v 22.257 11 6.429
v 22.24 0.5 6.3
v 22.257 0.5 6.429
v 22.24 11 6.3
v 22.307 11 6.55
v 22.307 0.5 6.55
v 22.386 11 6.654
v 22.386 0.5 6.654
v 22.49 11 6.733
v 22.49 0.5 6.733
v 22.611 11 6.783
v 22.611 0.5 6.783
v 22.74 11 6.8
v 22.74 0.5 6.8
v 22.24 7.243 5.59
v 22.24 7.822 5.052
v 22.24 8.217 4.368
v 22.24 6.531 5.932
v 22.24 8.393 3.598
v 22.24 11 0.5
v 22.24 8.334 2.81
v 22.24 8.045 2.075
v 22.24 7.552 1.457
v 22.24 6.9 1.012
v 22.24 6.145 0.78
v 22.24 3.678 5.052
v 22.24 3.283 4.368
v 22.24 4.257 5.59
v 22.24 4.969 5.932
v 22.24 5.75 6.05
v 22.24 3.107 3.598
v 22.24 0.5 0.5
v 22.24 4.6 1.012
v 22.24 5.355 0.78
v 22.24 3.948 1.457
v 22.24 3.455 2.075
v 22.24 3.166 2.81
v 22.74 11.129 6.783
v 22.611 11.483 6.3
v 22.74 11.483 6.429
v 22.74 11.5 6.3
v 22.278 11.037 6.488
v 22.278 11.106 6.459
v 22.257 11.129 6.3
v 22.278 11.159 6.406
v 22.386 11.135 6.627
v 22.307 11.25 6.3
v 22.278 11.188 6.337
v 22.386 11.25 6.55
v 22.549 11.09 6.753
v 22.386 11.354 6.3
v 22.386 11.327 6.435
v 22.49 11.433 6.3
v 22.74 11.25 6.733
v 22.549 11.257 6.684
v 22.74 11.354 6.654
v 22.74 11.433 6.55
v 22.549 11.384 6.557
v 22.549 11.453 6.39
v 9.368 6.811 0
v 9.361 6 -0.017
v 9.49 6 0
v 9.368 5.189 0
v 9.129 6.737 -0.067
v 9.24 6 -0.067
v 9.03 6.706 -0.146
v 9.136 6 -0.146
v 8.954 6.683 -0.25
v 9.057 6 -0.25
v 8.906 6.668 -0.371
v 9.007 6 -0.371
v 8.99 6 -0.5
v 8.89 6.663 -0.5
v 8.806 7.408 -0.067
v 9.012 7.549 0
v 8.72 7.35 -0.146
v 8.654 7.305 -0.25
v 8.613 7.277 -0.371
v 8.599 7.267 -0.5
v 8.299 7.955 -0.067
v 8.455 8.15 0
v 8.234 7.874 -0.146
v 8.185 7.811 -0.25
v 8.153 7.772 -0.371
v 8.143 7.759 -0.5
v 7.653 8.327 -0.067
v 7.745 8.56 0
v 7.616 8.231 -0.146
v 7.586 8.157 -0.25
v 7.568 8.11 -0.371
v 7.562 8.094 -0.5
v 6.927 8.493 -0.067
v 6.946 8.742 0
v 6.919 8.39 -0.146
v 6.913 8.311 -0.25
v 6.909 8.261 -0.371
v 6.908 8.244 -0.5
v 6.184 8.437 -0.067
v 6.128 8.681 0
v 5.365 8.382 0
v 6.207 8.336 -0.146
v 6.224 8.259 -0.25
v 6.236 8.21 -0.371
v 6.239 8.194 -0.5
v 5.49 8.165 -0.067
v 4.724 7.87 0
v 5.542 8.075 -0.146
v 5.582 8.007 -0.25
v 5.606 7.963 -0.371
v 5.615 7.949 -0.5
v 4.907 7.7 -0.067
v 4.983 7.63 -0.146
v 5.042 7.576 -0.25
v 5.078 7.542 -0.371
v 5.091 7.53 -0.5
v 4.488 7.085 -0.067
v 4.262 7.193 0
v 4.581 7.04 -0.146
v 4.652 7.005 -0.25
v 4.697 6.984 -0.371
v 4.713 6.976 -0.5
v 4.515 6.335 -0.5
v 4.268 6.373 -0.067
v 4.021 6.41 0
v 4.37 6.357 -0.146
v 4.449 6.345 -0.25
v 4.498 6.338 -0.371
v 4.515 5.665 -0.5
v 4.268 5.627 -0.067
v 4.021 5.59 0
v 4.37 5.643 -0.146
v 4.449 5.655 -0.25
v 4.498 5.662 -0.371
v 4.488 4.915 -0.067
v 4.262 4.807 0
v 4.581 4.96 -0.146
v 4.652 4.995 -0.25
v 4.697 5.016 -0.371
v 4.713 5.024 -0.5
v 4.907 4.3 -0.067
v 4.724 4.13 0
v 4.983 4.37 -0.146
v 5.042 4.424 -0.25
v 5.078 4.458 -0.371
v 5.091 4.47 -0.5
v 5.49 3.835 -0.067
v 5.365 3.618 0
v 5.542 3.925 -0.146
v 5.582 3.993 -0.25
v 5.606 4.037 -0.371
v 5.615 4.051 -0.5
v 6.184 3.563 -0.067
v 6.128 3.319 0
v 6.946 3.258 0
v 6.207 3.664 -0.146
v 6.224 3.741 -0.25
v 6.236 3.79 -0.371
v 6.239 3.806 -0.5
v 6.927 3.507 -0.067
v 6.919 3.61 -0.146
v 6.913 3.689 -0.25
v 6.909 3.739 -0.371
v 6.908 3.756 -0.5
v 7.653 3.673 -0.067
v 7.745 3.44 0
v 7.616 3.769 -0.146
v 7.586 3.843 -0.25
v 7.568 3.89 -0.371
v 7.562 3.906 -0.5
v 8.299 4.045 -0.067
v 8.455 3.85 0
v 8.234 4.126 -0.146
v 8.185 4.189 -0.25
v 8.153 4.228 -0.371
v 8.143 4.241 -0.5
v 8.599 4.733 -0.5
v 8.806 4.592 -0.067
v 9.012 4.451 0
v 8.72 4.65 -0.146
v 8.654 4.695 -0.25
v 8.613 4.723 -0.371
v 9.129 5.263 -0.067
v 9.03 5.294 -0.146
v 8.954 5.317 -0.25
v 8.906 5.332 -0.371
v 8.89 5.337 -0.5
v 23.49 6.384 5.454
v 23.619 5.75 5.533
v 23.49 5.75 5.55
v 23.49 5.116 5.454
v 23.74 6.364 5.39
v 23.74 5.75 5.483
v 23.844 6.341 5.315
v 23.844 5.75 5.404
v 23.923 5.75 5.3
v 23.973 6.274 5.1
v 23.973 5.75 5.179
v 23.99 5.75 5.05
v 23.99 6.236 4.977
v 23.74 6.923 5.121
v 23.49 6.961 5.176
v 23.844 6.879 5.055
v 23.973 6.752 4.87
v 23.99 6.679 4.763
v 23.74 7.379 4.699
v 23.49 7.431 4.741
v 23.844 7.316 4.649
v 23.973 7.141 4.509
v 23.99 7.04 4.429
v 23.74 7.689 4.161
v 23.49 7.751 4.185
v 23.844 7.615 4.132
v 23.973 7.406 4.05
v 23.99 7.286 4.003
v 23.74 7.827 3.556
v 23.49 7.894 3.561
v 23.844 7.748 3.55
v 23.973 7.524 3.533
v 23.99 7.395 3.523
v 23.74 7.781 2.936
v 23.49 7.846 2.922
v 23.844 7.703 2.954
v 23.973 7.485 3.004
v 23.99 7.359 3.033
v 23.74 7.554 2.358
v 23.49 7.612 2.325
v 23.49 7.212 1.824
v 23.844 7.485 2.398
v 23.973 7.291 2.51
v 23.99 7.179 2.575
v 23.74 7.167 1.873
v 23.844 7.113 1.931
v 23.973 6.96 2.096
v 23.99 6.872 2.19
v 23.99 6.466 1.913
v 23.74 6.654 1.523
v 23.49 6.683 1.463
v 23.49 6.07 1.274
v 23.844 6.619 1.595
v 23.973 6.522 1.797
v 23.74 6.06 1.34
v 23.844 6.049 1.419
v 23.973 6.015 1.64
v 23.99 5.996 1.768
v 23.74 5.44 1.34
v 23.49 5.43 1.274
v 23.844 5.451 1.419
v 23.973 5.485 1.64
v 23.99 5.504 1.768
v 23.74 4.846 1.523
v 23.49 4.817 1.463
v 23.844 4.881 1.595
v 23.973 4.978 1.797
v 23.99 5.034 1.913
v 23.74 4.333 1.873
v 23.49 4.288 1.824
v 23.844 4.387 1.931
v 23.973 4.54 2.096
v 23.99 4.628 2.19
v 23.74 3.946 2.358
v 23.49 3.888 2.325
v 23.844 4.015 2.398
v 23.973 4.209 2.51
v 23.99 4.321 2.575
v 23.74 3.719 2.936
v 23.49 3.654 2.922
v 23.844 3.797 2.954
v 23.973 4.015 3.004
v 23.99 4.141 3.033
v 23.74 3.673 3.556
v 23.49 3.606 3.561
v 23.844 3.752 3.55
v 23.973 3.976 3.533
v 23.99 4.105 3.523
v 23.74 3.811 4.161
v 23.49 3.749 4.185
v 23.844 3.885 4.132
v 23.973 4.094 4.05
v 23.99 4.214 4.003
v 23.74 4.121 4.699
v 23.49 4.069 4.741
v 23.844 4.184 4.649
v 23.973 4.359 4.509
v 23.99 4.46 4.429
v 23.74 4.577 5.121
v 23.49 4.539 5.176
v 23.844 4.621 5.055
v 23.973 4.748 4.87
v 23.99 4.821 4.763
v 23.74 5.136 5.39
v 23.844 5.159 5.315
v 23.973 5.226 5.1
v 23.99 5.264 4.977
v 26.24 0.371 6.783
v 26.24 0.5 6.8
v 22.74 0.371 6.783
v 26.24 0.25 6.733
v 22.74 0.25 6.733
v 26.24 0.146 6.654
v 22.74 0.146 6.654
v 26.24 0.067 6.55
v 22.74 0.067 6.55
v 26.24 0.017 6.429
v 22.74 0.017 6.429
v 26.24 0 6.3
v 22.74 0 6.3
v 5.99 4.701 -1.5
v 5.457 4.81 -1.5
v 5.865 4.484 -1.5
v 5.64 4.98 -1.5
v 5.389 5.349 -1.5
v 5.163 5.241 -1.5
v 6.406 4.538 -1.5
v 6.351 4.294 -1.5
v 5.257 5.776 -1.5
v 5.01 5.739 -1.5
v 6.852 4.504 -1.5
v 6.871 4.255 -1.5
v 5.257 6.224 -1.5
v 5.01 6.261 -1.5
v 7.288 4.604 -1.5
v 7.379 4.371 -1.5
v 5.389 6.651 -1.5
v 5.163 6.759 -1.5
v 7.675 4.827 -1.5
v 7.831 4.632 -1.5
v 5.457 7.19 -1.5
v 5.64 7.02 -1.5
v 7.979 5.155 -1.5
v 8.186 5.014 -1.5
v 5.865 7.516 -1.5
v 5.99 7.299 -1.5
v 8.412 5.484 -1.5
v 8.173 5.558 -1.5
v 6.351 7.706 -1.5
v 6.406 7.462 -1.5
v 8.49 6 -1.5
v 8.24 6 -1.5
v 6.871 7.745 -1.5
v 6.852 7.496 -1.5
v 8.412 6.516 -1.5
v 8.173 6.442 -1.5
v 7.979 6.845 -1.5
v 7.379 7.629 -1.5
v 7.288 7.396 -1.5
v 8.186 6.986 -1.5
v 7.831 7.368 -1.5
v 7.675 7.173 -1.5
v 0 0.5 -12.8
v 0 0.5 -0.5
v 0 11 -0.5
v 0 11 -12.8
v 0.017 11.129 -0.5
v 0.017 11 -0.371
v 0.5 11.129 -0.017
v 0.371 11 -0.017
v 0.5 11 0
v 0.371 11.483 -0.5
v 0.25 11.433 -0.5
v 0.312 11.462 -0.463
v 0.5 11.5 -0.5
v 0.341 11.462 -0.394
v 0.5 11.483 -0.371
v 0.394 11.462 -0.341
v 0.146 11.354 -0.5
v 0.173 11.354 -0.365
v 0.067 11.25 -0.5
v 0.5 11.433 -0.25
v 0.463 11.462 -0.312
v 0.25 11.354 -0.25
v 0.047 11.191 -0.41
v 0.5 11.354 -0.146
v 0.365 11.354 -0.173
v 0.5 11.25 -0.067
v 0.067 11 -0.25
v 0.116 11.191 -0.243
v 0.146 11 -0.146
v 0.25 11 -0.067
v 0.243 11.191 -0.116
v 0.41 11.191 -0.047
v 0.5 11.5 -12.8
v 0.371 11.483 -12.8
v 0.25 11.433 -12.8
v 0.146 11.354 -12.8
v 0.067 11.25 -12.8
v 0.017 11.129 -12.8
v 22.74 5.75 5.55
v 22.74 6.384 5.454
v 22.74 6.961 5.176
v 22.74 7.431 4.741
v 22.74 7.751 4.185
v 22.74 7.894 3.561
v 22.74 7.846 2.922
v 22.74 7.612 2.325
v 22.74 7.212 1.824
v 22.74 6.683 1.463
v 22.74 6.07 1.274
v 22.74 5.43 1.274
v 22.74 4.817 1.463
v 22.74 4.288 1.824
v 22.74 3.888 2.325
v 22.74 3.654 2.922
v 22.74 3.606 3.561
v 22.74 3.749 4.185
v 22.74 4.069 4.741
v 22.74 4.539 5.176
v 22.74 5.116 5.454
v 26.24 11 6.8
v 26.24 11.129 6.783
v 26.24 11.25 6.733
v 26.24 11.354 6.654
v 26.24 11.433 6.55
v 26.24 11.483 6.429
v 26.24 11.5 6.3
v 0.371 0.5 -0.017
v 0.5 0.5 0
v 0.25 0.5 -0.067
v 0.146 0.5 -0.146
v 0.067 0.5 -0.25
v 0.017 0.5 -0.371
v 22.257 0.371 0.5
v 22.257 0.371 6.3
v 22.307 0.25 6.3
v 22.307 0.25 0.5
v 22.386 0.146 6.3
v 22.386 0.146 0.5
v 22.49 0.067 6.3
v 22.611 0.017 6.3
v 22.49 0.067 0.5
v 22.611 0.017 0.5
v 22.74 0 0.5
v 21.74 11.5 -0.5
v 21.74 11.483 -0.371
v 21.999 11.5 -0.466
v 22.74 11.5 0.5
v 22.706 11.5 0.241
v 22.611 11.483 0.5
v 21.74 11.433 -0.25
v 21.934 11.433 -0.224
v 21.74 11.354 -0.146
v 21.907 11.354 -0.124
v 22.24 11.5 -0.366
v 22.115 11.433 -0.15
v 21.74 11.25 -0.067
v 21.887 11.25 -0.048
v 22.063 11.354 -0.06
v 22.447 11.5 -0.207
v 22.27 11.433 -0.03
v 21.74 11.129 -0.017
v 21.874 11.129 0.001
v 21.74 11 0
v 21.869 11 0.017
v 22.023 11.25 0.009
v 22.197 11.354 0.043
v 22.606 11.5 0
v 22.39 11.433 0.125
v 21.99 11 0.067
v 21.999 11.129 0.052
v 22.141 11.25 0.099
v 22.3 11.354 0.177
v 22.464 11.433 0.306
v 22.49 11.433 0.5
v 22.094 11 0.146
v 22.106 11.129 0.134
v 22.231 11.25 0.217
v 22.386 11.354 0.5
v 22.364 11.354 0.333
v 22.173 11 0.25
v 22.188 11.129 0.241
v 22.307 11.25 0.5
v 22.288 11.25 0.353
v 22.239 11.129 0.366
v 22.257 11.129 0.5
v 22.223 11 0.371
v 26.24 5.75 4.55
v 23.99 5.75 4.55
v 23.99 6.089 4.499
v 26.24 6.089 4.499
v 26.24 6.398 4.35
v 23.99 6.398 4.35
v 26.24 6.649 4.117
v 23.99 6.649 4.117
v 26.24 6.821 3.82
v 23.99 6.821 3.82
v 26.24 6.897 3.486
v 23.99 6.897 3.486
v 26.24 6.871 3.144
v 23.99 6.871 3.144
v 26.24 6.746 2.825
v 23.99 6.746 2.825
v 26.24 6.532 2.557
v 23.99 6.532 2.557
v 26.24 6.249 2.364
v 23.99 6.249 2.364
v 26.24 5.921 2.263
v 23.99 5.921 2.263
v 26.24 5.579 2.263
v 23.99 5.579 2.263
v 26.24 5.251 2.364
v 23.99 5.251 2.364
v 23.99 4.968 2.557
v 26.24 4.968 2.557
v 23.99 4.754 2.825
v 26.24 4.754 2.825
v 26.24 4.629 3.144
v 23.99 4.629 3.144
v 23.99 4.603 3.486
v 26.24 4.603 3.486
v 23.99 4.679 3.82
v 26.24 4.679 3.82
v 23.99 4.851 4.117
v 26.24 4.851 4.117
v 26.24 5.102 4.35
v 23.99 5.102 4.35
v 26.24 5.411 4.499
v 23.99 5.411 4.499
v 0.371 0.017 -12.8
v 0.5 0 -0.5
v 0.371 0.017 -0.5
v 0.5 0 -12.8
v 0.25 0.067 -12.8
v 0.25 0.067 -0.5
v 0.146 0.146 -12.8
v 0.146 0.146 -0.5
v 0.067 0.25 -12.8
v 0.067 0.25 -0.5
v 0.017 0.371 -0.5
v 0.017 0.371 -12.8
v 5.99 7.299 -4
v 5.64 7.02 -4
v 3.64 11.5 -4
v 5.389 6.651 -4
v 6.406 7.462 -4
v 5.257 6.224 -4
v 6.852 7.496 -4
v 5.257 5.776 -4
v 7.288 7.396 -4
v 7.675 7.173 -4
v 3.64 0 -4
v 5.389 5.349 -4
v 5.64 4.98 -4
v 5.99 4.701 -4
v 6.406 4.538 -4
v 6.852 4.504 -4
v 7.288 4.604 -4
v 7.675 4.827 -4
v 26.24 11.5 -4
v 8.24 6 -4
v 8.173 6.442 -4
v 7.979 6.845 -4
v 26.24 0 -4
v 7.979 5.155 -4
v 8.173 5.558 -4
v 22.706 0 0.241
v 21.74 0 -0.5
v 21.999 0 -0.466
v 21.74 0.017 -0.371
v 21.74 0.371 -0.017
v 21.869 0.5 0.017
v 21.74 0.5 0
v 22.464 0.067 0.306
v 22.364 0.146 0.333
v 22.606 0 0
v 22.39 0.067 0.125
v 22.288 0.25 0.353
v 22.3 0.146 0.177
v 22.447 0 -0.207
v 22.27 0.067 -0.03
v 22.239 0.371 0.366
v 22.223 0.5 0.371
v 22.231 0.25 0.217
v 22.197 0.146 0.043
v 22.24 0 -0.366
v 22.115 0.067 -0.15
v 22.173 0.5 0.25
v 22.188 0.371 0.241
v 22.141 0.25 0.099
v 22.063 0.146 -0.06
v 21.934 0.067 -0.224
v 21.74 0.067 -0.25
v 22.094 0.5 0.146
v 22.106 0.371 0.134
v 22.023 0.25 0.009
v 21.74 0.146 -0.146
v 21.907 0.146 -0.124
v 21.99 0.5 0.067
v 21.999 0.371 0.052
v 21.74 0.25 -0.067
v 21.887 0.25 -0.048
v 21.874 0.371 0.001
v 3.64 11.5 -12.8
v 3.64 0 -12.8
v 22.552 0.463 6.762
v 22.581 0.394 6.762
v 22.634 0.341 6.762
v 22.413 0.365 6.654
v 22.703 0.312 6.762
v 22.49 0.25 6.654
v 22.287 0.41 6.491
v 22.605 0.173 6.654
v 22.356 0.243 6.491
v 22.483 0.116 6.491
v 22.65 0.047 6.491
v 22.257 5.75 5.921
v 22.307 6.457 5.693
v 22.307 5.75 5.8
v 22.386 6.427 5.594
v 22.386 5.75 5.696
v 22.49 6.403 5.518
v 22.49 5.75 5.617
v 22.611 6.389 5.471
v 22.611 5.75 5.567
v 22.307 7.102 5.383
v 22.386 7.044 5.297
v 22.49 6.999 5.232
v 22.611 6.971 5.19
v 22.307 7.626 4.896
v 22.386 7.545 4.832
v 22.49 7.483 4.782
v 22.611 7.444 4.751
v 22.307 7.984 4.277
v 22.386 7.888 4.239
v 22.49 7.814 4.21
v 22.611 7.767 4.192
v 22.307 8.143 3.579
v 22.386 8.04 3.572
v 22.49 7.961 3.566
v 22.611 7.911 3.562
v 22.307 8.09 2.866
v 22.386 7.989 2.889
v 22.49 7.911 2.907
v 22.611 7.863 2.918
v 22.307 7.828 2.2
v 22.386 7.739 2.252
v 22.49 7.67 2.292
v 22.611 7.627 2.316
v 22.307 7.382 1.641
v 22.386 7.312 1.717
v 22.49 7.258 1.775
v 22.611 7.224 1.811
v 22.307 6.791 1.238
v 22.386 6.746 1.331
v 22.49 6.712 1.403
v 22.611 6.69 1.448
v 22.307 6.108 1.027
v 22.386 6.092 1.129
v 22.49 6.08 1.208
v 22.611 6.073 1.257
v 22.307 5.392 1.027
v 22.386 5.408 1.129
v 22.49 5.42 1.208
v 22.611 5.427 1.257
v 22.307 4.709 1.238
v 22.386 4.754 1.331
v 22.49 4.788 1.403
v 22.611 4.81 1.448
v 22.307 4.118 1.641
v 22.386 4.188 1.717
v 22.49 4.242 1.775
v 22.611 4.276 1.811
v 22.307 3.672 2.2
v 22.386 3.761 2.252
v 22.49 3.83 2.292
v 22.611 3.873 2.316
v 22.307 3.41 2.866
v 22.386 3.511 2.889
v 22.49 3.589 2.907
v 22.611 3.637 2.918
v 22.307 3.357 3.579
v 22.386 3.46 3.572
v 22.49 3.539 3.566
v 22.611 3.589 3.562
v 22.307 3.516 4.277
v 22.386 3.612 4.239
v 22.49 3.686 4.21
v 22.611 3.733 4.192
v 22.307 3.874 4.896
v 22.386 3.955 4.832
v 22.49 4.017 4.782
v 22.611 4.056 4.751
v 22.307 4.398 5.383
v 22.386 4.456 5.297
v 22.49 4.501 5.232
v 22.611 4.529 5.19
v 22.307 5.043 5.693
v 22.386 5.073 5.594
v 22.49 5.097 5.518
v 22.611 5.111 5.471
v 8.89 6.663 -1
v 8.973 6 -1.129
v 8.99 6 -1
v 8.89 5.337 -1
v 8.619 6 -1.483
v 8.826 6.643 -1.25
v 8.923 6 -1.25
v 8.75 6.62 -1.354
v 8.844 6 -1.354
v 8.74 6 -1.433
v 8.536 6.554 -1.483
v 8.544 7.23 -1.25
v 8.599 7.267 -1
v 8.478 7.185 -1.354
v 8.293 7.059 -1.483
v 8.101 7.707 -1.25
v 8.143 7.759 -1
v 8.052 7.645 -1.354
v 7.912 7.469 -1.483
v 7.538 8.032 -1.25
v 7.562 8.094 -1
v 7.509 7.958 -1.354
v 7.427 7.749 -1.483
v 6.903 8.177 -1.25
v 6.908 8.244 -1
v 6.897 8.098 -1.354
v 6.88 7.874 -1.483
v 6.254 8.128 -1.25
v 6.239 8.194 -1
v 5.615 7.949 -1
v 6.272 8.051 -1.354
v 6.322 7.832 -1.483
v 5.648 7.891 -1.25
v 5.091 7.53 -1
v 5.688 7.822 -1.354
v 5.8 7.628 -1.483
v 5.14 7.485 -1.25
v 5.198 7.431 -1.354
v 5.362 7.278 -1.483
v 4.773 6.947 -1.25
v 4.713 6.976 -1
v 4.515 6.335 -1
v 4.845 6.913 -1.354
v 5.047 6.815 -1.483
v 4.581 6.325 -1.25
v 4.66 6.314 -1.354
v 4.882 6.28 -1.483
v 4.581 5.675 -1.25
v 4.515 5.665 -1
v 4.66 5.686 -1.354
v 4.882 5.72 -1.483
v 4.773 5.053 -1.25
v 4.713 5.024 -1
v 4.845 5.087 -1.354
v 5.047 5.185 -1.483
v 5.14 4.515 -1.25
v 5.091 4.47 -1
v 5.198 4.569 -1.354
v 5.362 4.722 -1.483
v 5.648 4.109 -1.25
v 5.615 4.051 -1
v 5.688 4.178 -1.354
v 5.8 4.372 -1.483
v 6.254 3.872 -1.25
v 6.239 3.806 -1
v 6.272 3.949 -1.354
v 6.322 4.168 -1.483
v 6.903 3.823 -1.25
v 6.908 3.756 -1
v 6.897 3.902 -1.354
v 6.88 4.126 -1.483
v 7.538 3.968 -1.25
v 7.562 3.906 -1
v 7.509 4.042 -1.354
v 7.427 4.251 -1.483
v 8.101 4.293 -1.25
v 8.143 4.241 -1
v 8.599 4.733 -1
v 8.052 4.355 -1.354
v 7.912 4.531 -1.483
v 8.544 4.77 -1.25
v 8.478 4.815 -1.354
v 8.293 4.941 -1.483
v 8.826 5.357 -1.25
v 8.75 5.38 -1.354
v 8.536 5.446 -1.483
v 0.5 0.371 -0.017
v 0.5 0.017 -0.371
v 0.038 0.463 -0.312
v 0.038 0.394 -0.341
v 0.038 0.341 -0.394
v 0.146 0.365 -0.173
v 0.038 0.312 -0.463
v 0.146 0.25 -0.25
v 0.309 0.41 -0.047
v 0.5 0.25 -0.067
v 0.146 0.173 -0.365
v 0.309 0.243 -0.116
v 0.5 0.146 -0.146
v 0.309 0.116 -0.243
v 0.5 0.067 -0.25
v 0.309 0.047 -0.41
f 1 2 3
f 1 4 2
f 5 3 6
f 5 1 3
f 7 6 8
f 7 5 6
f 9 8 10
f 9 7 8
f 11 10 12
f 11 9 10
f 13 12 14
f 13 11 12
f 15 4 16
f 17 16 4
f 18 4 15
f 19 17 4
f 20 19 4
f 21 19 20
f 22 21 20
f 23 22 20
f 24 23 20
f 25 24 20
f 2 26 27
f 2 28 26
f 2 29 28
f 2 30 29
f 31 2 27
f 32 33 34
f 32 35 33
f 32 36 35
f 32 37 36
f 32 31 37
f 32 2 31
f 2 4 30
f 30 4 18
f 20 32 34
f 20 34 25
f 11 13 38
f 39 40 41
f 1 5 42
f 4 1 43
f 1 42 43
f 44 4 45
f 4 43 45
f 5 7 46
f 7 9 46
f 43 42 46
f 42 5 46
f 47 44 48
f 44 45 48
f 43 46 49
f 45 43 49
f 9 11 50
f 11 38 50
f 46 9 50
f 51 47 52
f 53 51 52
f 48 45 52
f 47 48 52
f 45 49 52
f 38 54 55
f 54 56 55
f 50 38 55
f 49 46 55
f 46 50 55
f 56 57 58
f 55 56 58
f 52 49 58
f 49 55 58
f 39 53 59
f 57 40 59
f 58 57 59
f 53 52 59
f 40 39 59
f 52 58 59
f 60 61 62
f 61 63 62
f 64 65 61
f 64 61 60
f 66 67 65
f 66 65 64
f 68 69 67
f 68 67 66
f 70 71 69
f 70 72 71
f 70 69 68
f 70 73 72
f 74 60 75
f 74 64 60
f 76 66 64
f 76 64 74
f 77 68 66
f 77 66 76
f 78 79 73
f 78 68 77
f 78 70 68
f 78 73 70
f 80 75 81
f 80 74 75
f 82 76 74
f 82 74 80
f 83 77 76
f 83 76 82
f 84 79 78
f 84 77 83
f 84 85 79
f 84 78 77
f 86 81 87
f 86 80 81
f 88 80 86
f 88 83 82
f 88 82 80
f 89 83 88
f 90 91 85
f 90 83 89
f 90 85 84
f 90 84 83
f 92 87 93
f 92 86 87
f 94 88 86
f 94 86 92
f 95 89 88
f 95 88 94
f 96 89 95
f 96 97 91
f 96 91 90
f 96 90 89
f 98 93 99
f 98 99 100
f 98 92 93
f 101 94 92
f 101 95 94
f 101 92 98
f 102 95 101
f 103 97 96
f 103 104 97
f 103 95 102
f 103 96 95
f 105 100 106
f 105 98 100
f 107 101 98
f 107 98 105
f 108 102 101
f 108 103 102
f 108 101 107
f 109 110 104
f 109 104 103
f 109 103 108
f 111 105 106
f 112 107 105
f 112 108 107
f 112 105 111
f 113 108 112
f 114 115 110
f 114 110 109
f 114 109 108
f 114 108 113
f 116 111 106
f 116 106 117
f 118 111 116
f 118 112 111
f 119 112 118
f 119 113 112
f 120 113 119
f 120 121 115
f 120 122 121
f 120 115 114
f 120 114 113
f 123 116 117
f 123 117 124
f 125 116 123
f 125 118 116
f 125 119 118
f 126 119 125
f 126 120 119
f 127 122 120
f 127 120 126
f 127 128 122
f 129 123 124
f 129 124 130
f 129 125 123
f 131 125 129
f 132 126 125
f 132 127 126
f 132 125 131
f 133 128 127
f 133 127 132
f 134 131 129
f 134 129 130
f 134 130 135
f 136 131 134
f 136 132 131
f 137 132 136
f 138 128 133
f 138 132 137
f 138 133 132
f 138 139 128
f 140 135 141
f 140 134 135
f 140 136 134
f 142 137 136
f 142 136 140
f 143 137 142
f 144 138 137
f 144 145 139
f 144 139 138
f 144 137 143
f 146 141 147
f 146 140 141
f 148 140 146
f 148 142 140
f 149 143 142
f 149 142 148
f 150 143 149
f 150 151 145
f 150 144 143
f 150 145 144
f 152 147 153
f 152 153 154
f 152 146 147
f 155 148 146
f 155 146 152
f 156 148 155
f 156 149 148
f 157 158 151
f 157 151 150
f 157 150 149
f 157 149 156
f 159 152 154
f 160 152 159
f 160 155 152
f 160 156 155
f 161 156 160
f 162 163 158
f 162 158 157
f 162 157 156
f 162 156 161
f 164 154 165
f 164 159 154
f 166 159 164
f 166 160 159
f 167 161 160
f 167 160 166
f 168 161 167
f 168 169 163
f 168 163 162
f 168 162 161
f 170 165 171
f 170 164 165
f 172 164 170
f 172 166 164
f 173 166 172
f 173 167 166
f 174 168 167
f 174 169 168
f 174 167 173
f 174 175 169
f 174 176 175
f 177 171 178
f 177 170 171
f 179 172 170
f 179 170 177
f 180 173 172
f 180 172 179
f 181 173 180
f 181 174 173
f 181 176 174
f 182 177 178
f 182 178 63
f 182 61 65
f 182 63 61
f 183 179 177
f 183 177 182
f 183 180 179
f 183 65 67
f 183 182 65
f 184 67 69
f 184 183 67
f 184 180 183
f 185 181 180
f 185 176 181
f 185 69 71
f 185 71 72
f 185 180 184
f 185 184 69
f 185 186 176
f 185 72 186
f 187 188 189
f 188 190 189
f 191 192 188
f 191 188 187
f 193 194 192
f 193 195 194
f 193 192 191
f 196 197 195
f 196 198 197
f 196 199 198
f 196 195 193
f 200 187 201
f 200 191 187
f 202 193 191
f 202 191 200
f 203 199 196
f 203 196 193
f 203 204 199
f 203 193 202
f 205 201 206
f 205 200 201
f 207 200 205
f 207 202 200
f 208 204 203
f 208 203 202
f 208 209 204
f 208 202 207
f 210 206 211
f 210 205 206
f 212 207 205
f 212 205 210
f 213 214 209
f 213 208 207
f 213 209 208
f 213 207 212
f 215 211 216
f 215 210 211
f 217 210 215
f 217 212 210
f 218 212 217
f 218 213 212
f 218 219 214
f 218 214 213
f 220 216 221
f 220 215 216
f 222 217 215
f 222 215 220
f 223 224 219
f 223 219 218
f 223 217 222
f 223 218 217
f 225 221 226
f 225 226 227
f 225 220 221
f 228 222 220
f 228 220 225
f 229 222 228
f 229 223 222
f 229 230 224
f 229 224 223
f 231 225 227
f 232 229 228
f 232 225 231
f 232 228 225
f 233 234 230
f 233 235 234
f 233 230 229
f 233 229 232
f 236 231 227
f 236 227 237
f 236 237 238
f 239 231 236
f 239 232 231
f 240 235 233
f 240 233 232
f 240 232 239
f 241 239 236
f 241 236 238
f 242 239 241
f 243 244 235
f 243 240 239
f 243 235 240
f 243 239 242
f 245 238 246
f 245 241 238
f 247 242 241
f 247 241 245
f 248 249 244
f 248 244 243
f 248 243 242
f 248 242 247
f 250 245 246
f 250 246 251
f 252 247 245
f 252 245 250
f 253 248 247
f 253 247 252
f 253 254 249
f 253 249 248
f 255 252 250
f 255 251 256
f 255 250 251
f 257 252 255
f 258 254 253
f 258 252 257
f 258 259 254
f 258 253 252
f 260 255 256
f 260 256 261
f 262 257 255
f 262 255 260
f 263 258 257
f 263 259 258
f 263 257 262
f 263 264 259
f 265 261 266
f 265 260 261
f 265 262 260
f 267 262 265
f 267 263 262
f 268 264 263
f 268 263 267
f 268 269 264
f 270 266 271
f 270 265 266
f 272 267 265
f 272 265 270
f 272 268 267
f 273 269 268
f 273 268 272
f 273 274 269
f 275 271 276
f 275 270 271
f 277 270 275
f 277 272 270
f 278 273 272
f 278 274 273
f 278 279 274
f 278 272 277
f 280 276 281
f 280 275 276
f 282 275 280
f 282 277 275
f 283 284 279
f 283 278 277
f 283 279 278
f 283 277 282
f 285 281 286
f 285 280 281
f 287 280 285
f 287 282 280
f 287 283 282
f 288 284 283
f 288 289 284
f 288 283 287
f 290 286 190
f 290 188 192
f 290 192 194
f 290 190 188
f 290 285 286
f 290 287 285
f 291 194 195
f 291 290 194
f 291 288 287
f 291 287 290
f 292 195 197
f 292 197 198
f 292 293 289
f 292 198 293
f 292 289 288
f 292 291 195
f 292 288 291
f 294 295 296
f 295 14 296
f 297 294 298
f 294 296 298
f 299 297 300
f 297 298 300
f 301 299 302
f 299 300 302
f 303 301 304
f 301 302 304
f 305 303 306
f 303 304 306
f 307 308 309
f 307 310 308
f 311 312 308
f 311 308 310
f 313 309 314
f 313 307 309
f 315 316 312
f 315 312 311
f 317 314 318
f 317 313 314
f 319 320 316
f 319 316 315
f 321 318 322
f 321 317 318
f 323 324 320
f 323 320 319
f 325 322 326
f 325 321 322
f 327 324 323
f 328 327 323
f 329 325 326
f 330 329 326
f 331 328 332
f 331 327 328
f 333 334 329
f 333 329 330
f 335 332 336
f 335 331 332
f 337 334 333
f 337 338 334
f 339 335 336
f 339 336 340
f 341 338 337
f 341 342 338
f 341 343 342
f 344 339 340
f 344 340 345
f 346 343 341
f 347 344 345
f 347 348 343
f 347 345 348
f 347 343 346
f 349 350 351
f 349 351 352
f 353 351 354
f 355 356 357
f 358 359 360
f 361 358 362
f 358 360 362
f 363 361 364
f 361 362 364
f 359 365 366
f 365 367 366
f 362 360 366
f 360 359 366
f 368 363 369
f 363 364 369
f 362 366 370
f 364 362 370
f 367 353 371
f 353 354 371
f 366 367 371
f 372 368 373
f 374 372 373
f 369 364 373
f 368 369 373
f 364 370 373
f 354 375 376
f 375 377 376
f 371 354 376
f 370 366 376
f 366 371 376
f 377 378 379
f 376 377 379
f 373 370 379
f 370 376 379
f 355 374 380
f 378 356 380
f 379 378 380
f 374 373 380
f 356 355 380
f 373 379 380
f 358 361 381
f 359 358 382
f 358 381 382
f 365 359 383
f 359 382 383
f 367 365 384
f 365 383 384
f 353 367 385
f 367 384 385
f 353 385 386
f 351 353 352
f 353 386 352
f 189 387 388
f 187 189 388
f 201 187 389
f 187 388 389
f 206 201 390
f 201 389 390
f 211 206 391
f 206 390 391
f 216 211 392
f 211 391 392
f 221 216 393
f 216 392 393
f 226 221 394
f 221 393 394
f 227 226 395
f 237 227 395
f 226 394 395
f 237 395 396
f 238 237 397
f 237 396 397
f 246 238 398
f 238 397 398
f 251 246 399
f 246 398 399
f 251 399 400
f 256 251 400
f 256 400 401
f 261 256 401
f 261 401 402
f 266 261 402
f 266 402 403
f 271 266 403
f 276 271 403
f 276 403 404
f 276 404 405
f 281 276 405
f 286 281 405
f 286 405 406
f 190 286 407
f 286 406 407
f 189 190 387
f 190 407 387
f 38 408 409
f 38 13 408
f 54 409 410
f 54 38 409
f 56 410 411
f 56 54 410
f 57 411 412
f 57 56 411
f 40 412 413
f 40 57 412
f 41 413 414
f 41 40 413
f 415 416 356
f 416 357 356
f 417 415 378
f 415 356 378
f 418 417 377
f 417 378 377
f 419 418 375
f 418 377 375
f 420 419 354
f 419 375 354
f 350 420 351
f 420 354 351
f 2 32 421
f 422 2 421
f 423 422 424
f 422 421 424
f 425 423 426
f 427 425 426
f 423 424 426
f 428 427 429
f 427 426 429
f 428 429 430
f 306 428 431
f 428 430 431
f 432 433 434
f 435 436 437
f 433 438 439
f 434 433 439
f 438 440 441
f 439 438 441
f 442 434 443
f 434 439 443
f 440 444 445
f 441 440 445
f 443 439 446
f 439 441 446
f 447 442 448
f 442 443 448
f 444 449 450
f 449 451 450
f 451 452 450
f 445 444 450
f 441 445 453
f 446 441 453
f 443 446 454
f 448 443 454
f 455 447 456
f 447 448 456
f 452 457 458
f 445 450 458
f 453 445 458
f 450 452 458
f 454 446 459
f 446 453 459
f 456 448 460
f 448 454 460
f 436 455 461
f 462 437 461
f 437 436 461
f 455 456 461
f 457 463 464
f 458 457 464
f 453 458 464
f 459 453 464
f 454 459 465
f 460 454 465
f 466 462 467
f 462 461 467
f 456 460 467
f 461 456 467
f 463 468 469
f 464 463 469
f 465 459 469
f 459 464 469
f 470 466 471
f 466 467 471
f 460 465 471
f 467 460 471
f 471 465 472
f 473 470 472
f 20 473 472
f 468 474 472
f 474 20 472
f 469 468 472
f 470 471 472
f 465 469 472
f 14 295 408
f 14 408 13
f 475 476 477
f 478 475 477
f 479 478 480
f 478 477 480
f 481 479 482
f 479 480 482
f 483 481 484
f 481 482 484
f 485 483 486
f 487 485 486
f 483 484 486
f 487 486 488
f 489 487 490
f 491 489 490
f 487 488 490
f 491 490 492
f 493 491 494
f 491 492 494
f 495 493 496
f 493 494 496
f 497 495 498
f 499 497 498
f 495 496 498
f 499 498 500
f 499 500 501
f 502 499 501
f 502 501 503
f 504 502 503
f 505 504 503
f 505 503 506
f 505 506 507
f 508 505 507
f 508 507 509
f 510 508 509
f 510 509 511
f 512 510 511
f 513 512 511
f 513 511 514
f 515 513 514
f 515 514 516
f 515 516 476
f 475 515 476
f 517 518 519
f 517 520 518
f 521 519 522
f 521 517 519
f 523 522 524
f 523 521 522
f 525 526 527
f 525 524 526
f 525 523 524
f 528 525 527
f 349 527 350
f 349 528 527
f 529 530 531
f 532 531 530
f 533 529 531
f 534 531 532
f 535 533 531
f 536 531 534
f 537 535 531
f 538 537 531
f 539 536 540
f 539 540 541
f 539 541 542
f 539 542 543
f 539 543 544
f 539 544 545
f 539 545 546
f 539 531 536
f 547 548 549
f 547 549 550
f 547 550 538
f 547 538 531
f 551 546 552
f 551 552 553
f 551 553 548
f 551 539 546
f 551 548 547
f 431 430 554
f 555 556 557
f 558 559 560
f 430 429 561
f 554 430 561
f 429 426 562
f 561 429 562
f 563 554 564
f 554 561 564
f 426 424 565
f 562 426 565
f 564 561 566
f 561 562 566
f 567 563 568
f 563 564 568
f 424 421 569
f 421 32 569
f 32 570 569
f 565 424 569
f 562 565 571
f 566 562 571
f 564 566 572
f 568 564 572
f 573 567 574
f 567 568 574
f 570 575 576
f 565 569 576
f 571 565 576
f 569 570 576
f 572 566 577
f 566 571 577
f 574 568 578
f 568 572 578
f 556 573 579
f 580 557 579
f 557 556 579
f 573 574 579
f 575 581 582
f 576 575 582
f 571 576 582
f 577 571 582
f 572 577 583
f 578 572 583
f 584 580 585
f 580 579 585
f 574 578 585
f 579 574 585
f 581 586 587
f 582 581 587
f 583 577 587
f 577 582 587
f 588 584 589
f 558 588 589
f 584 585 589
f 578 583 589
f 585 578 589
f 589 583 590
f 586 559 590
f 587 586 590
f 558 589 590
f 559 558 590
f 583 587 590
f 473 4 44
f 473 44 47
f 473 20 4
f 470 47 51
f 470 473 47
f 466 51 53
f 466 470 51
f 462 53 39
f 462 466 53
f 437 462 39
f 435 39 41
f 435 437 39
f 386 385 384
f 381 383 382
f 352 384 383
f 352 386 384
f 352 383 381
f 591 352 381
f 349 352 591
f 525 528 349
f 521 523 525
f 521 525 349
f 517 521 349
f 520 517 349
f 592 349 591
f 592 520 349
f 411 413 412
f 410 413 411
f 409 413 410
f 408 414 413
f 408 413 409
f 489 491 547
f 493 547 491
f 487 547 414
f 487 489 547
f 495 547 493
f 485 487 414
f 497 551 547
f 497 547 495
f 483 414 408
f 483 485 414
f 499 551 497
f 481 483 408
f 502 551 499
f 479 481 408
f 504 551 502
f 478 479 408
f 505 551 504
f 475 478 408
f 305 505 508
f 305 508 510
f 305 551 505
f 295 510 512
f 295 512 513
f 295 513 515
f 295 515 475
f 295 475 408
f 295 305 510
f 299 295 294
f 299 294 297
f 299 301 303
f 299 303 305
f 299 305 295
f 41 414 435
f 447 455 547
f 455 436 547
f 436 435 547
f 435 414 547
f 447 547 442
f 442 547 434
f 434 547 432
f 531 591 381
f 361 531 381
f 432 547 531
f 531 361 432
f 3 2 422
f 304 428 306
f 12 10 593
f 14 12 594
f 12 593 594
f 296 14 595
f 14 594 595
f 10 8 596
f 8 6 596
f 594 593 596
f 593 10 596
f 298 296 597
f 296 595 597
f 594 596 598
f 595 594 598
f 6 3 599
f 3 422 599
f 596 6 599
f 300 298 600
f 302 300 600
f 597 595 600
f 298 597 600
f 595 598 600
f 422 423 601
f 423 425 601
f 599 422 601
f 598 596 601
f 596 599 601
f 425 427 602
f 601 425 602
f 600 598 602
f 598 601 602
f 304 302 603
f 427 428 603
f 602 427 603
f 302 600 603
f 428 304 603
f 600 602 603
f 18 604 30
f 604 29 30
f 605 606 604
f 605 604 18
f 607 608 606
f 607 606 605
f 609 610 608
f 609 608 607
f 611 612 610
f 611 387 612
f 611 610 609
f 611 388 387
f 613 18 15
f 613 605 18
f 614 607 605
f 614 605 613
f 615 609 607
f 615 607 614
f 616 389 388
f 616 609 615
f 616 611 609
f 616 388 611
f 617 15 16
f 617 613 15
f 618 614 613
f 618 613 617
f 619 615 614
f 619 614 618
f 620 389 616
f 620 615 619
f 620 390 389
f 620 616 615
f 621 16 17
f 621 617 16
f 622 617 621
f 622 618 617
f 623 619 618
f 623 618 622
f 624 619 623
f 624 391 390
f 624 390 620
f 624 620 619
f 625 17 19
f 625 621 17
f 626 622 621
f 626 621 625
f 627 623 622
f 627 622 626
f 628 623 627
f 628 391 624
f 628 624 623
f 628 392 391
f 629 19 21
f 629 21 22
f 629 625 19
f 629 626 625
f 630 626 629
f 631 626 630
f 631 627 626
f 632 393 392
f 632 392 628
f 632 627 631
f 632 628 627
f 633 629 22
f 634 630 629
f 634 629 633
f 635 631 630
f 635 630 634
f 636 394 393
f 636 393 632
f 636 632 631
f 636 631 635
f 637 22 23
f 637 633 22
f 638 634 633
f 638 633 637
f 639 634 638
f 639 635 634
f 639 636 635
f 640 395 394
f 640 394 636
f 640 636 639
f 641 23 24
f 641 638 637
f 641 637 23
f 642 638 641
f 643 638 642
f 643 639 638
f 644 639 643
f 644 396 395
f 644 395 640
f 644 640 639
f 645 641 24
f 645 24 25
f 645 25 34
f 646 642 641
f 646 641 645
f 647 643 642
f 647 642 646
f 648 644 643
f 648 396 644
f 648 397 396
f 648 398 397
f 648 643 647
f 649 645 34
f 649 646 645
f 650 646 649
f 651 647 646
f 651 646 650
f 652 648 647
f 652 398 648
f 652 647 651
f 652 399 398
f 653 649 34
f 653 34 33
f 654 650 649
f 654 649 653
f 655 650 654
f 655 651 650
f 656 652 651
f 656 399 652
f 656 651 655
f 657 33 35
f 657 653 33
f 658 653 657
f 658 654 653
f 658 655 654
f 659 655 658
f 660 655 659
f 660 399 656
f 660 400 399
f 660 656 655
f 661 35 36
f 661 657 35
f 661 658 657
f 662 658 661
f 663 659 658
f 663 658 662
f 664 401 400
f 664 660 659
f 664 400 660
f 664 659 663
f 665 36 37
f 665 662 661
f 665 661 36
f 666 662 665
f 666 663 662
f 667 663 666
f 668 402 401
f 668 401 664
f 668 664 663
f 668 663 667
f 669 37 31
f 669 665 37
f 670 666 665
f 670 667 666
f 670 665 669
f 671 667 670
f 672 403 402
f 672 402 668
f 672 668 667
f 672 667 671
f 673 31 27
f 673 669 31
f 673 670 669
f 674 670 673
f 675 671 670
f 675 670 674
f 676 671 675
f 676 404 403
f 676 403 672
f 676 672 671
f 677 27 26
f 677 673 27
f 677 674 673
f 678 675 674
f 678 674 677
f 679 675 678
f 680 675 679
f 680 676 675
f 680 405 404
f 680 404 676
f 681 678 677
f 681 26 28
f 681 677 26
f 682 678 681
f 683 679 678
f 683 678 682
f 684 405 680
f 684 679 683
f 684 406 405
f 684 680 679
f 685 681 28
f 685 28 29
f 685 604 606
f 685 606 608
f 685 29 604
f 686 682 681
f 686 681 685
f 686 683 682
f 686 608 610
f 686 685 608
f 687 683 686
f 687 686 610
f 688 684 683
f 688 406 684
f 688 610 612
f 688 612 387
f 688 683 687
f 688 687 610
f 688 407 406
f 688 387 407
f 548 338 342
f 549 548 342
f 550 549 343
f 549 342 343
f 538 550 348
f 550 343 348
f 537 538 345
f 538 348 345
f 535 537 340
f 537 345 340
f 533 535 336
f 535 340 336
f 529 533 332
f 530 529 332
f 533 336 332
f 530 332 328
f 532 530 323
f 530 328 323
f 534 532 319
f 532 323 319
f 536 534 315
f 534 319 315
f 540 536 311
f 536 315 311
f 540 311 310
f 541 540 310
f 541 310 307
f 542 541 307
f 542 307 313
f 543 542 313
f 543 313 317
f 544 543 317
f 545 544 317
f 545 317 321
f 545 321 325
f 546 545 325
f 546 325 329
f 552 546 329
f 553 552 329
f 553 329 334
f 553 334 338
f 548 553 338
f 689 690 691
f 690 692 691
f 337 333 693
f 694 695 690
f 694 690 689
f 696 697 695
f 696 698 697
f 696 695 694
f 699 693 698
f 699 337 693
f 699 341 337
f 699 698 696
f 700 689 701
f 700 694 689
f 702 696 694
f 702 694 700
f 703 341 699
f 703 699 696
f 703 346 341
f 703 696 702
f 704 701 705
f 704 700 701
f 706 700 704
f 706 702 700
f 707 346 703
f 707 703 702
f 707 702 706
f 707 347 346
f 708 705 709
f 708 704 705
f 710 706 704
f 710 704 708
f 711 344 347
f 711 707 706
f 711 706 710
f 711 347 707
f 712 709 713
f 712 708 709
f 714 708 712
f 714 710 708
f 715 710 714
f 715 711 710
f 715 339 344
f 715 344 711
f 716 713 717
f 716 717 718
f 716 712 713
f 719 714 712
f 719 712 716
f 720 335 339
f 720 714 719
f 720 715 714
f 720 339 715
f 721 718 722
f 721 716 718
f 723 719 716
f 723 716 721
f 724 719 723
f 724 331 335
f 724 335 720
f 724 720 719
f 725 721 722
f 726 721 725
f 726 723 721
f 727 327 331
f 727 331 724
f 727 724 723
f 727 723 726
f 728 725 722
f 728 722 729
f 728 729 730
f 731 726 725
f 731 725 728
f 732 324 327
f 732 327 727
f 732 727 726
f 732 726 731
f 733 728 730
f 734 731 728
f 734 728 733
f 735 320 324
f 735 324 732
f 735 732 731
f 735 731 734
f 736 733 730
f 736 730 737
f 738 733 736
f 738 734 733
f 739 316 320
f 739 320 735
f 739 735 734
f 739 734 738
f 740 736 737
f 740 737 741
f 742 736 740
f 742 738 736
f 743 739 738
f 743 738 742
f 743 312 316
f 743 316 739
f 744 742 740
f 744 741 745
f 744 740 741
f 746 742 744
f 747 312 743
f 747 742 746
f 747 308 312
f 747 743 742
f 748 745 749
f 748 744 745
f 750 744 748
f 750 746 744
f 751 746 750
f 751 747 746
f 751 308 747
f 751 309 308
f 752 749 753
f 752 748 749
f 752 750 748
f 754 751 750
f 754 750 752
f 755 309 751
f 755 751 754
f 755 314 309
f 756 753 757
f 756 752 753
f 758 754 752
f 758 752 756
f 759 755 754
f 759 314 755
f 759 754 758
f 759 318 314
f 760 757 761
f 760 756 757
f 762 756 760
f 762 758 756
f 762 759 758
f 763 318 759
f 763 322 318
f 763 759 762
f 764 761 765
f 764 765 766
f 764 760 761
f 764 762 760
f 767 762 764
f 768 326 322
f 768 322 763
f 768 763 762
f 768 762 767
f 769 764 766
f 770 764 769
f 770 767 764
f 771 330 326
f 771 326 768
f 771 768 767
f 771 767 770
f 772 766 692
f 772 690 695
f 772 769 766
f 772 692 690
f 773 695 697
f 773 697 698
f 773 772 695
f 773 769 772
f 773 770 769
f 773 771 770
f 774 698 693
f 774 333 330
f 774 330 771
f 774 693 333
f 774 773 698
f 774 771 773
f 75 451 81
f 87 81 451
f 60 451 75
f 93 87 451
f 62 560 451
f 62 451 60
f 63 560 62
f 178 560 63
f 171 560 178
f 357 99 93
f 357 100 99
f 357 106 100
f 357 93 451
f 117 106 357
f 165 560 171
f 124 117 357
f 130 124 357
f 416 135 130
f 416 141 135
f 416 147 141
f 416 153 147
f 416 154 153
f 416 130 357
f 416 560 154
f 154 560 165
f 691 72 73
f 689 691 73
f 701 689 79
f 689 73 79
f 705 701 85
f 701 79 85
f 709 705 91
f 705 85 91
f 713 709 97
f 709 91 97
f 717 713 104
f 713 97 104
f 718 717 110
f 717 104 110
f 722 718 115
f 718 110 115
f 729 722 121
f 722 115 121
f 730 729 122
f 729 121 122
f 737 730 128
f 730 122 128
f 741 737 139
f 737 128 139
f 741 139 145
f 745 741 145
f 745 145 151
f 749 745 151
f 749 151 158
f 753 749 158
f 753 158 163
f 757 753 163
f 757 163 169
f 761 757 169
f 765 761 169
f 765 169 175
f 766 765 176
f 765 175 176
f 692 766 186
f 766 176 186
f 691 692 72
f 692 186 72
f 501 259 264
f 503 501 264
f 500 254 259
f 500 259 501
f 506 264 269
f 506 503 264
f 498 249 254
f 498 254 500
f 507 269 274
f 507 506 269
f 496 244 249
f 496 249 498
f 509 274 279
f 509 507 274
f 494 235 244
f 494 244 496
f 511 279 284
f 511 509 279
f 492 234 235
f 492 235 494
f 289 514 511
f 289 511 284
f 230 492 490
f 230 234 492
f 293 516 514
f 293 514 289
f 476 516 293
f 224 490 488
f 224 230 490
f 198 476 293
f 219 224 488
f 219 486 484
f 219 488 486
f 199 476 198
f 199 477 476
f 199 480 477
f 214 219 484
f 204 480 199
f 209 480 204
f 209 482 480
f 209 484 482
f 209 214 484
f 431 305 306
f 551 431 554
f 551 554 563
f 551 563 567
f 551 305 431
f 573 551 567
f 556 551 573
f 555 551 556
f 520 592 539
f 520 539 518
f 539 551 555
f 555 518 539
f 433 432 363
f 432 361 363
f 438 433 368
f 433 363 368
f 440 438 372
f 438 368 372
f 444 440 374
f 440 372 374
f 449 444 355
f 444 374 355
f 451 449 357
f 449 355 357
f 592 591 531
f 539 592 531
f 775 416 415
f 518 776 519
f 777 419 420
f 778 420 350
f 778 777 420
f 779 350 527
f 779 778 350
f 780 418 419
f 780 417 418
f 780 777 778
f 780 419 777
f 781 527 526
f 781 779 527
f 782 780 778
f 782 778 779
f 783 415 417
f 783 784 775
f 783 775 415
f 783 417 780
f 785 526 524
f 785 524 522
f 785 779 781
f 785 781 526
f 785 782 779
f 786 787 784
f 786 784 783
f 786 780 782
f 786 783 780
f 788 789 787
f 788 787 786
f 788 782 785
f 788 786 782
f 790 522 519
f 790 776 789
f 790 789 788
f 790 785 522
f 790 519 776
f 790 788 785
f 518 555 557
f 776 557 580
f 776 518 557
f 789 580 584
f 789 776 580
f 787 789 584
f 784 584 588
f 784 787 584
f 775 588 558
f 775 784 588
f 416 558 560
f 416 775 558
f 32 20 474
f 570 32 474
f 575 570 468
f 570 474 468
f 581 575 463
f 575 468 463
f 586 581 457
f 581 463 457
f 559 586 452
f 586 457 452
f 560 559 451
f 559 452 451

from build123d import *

# Parameters (mm, degrees)
BOSS_EXTRUDE1_DEPTH = 11.5
SKETCH4_R           = 1.5
CUT_EXTRUDE1_DEPTH  = 4.5
SKETCH5_R           = 2.25
CUT_EXTRUDE2_DEPTH  = 1.5
SKETCH6_R           = 2.15
CUT_EXTRUDE3_DEPTH  = 1.75
SKETCH7_R           = 1.15
CUT_EXTRUDE4_DEPTH  = 2.5
FILLET4_R           = 0.5
FILLET5_R           = 0.5
FILLET6_R           = 0.5


with BuildPart() as part:
    # Sketch1 → Boss-Extrude1 (new body)
    with BuildSketch(Plane(origin=(0, 0, 0), x_dir=(1, 0, 0), z_dir=(0, 1, 0))):
        Polygon((0, 0), (0, 12.8), (3.64, 12.8), (3.64, 4), (26.24, 4), (26.24, -6.8), (22.24, -6.8), (22.24, 0), align=None)
    extrude(amount=BOSS_EXTRUDE1_DEPTH)

    # Sketch4 → Cut-Extrude1 (cut)
    with BuildSketch(Plane.XY):
        with Locations((6.74, 6)):
            Circle(SKETCH4_R)
    extrude(amount=-CUT_EXTRUDE1_DEPTH, mode=Mode.SUBTRACT)

    # Sketch5 → Cut-Extrude2 (cut)
    with BuildSketch(Plane.XY):
        with Locations((6.74, 6)):
            Circle(SKETCH5_R)
    extrude(amount=-CUT_EXTRUDE2_DEPTH, mode=Mode.SUBTRACT)

    # Sketch6 → Cut-Extrude3 (cut)
    with BuildSketch(Plane.ZY.offset(-22.24)):
        with Locations((3.4, 5.75)):
            Circle(SKETCH6_R)
    extrude(amount=-CUT_EXTRUDE3_DEPTH, mode=Mode.SUBTRACT)

    # Sketch7 → Cut-Extrude4 (cut)
    with BuildSketch(Plane.ZY.offset(-23.99)):
        with Locations((3.4, 5.75)):
            Circle(SKETCH7_R)
    extrude(amount=-CUT_EXTRUDE4_DEPTH, mode=Mode.SUBTRACT)

    # Fillet4
    fillet4_edges = [part.edges().sort_by_distance(p)[0] for p in [
        (4.49, 6, 0),
        (4.49, 6, -1.5),
    ]]
    fillet(fillet4_edges, radius=FILLET4_R)

    # Fillet5
    fillet5_edges = [part.edges().sort_by_distance(p)[0] for p in [
        (23.99, 5.75, 1.25),
        (22.24, 5.75, 1.25),
    ]]
    fillet(fillet5_edges, radius=FILLET5_R)

    # Fillet6
    fillet6_edges = [part.edges().sort_by_distance(p)[0] for p in [
        (24.24, 11.5, 6.8),
        (22.24, 0, 3.4),
        (11.12, 0, 0),
        (0, 5.75, 0),
        (22.24, 5.75, 6.8),
        (22.24, 5.75, 0),
        (0, 11.5, -6.4),
        (11.12, 11.5, 0),
        (22.24, 11.5, 3.4),
        (0, 0, -6.4),
        (24.24, 0, 6.8),
    ]]
    fillet(fillet6_edges, radius=FILLET6_R)


solid = part.part
